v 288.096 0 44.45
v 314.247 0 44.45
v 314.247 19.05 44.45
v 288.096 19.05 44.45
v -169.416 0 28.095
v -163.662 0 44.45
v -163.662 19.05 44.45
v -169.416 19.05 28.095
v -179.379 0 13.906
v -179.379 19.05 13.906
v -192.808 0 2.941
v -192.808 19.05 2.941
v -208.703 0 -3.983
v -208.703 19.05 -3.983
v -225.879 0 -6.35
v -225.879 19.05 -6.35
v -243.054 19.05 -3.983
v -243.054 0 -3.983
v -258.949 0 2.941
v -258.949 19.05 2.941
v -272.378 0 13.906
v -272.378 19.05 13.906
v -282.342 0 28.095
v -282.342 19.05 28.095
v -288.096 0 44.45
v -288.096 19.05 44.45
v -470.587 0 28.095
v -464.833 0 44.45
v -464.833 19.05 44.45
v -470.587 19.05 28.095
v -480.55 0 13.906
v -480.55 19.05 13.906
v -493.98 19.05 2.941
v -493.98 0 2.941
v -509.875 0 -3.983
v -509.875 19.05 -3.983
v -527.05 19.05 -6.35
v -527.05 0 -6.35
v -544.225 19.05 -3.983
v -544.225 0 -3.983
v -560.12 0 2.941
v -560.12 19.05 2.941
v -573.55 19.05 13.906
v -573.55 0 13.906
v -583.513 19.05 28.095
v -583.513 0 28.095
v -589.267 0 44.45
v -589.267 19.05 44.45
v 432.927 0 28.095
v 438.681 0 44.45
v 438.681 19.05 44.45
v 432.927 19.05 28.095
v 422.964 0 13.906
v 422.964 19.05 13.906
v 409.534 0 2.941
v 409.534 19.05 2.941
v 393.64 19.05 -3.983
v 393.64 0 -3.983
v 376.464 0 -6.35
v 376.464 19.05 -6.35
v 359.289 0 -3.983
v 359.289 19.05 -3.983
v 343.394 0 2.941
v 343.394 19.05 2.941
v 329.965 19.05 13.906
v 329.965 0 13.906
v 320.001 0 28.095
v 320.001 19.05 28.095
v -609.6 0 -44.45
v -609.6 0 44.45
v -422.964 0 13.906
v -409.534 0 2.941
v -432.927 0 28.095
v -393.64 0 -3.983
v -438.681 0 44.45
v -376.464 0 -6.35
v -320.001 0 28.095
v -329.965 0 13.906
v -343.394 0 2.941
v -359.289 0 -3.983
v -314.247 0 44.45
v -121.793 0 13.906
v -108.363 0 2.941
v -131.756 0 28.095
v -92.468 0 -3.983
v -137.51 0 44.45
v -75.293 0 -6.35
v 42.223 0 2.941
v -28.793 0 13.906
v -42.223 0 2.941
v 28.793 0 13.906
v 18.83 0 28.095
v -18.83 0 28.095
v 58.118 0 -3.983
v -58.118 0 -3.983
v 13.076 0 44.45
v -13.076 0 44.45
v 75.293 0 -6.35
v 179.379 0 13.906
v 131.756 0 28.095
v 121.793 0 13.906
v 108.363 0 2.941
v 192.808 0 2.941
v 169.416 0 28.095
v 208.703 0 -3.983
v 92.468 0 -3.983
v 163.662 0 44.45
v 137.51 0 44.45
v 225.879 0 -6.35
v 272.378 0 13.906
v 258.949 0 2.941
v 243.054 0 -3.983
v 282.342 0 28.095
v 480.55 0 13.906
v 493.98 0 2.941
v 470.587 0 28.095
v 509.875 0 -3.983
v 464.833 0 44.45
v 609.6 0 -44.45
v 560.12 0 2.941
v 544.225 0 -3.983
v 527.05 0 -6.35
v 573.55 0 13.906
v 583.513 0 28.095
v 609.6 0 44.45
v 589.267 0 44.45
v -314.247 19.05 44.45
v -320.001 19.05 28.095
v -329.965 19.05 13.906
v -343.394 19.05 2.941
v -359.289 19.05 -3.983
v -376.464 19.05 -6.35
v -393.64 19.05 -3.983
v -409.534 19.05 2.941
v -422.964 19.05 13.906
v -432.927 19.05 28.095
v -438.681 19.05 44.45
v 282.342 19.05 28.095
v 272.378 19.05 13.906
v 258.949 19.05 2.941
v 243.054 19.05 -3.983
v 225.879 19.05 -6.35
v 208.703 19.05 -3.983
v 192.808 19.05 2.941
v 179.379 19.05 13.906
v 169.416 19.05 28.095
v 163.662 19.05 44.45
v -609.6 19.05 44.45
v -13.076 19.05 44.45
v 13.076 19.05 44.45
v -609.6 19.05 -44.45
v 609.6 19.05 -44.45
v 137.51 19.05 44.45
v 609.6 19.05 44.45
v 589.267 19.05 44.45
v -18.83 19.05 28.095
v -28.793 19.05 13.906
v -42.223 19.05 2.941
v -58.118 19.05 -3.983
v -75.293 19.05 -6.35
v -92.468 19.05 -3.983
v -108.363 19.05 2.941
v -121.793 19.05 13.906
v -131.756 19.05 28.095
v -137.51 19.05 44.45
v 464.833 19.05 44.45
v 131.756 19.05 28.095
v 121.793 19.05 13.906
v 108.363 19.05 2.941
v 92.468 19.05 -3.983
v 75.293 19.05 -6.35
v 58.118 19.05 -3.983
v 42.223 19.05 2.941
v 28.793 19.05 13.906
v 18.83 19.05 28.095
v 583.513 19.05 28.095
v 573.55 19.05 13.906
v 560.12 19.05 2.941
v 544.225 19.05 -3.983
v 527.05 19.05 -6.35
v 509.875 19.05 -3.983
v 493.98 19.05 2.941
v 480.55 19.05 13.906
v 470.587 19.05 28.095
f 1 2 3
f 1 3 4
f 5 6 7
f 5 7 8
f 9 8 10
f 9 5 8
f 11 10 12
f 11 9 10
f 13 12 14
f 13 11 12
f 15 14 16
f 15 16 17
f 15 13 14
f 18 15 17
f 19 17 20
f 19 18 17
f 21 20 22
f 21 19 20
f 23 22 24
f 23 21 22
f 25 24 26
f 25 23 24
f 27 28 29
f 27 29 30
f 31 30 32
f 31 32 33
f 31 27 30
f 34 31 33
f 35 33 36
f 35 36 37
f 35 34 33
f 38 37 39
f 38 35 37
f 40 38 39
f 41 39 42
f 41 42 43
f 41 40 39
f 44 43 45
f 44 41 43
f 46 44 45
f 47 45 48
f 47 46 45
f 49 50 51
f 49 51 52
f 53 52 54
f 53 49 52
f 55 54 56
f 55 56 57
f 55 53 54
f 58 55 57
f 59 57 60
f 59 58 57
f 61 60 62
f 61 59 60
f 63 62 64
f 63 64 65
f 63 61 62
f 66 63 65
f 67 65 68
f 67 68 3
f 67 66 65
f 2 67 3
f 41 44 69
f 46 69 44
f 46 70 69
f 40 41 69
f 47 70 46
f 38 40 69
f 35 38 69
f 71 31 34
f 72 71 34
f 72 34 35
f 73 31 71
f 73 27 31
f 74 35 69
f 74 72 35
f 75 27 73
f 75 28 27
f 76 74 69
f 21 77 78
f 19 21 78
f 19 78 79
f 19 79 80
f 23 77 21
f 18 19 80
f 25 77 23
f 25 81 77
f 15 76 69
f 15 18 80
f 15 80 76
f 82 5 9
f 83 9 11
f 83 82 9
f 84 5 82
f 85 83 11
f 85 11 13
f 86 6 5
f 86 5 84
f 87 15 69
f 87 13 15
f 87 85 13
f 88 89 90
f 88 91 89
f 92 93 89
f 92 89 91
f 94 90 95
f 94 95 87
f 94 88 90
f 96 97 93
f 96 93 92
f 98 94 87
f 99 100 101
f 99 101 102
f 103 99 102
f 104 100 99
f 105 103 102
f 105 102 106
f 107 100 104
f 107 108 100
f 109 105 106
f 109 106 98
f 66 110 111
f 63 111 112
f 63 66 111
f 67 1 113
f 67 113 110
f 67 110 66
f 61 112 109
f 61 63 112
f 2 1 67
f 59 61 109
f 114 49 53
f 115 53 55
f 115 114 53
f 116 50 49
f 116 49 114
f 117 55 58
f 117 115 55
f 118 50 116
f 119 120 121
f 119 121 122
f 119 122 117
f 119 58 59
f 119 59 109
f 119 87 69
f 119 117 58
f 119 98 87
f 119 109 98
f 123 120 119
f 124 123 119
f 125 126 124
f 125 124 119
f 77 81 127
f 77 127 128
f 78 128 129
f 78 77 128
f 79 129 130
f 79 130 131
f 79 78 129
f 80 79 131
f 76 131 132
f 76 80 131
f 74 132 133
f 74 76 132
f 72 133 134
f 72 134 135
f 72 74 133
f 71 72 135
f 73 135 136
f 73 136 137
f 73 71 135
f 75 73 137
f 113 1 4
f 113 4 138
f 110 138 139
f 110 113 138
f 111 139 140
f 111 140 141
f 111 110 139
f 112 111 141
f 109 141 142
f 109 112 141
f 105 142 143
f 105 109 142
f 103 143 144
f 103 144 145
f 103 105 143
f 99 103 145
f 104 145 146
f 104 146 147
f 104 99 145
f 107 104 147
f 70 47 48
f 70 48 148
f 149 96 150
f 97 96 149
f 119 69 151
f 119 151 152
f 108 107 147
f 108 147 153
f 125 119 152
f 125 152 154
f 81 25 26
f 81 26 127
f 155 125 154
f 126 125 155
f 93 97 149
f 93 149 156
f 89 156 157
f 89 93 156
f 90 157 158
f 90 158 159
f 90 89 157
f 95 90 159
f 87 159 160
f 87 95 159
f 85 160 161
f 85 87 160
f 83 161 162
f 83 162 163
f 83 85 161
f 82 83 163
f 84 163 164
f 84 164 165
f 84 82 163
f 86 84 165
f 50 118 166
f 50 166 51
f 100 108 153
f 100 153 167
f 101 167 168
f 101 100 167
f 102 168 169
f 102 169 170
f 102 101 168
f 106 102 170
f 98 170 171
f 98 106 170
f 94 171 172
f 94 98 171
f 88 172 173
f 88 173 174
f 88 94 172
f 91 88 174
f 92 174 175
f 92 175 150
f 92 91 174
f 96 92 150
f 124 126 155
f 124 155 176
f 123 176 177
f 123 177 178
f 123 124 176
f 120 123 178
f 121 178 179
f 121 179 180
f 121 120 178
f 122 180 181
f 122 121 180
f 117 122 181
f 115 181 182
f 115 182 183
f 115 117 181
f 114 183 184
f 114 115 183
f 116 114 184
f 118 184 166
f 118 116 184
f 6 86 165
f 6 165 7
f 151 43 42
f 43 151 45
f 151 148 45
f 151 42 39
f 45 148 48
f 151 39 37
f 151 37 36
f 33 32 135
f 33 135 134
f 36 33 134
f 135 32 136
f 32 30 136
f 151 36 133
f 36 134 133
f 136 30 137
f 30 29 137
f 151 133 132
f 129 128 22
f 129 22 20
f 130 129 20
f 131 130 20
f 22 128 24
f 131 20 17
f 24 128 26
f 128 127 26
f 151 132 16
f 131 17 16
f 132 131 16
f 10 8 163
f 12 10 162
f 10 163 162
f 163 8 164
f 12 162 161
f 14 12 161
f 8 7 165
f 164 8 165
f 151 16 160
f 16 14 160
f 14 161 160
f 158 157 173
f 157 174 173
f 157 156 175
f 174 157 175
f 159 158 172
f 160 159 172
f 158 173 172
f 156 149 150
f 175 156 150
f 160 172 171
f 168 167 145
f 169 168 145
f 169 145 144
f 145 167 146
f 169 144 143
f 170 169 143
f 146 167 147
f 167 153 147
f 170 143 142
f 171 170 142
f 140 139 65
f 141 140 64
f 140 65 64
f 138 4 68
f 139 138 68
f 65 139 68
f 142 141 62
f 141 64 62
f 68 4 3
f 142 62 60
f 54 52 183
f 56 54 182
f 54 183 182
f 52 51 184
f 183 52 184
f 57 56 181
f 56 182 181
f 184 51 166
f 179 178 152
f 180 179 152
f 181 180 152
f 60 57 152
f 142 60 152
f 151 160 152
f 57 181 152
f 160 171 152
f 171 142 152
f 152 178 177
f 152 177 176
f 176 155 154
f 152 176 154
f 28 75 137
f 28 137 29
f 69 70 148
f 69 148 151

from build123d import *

# Parameters (mm, degrees)
F1_DEPTH = 19.05


with BuildPart() as f1:
    # F0 (on Front) → F1 (new body)
    with BuildSketch(Plane.XZ):
        with BuildLine():
            Line((-609.6, -44.45), (609.6, -44.45))
            Line((609.6, -44.45), (609.6, 44.45))
            Line((609.6, 44.45), (589.267039, 44.45))
            ThreePointArc((589.267039, 44.45), (527.05, -6.35), (464.832961, 44.45))
            Line((464.832961, 44.45), (438.681325, 44.45))
            ThreePointArc((438.681325, 44.45), (376.464286, -6.35), (314.247246, 44.45))
            Line((314.247246, 44.45), (288.095611, 44.45))
            ThreePointArc((288.095611, 44.45), (225.878571, -6.35), (163.661532, 44.45))
            Line((163.661532, 44.45), (137.509897, 44.45))
            ThreePointArc((137.509897, 44.45), (75.292857, -6.35), (13.075818, 44.45))
            Line((13.075818, 44.45), (-13.075818, 44.45))
            ThreePointArc((-13.075818, 44.45), (-75.292857, -6.35), (-137.509897, 44.45))
            Line((-137.509897, 44.45), (-163.661532, 44.45))
            ThreePointArc((-163.661532, 44.45), (-225.878571, -6.35), (-288.095611, 44.45))
            Line((-288.095611, 44.45), (-314.247246, 44.45))
            ThreePointArc((-314.247246, 44.45), (-376.464286, -6.35), (-438.681325, 44.45))
            Line((-438.681325, 44.45), (-464.832961, 44.45))
            ThreePointArc((-464.832961, 44.45), (-527.05, -6.35), (-589.267039, 44.45))
            Line((-589.267039, 44.45), (-609.6, 44.45))
            Line((-609.6, 44.45), (-609.6, -44.45))
        make_face()
    extrude(amount=-F1_DEPTH)


solid = f1.part
